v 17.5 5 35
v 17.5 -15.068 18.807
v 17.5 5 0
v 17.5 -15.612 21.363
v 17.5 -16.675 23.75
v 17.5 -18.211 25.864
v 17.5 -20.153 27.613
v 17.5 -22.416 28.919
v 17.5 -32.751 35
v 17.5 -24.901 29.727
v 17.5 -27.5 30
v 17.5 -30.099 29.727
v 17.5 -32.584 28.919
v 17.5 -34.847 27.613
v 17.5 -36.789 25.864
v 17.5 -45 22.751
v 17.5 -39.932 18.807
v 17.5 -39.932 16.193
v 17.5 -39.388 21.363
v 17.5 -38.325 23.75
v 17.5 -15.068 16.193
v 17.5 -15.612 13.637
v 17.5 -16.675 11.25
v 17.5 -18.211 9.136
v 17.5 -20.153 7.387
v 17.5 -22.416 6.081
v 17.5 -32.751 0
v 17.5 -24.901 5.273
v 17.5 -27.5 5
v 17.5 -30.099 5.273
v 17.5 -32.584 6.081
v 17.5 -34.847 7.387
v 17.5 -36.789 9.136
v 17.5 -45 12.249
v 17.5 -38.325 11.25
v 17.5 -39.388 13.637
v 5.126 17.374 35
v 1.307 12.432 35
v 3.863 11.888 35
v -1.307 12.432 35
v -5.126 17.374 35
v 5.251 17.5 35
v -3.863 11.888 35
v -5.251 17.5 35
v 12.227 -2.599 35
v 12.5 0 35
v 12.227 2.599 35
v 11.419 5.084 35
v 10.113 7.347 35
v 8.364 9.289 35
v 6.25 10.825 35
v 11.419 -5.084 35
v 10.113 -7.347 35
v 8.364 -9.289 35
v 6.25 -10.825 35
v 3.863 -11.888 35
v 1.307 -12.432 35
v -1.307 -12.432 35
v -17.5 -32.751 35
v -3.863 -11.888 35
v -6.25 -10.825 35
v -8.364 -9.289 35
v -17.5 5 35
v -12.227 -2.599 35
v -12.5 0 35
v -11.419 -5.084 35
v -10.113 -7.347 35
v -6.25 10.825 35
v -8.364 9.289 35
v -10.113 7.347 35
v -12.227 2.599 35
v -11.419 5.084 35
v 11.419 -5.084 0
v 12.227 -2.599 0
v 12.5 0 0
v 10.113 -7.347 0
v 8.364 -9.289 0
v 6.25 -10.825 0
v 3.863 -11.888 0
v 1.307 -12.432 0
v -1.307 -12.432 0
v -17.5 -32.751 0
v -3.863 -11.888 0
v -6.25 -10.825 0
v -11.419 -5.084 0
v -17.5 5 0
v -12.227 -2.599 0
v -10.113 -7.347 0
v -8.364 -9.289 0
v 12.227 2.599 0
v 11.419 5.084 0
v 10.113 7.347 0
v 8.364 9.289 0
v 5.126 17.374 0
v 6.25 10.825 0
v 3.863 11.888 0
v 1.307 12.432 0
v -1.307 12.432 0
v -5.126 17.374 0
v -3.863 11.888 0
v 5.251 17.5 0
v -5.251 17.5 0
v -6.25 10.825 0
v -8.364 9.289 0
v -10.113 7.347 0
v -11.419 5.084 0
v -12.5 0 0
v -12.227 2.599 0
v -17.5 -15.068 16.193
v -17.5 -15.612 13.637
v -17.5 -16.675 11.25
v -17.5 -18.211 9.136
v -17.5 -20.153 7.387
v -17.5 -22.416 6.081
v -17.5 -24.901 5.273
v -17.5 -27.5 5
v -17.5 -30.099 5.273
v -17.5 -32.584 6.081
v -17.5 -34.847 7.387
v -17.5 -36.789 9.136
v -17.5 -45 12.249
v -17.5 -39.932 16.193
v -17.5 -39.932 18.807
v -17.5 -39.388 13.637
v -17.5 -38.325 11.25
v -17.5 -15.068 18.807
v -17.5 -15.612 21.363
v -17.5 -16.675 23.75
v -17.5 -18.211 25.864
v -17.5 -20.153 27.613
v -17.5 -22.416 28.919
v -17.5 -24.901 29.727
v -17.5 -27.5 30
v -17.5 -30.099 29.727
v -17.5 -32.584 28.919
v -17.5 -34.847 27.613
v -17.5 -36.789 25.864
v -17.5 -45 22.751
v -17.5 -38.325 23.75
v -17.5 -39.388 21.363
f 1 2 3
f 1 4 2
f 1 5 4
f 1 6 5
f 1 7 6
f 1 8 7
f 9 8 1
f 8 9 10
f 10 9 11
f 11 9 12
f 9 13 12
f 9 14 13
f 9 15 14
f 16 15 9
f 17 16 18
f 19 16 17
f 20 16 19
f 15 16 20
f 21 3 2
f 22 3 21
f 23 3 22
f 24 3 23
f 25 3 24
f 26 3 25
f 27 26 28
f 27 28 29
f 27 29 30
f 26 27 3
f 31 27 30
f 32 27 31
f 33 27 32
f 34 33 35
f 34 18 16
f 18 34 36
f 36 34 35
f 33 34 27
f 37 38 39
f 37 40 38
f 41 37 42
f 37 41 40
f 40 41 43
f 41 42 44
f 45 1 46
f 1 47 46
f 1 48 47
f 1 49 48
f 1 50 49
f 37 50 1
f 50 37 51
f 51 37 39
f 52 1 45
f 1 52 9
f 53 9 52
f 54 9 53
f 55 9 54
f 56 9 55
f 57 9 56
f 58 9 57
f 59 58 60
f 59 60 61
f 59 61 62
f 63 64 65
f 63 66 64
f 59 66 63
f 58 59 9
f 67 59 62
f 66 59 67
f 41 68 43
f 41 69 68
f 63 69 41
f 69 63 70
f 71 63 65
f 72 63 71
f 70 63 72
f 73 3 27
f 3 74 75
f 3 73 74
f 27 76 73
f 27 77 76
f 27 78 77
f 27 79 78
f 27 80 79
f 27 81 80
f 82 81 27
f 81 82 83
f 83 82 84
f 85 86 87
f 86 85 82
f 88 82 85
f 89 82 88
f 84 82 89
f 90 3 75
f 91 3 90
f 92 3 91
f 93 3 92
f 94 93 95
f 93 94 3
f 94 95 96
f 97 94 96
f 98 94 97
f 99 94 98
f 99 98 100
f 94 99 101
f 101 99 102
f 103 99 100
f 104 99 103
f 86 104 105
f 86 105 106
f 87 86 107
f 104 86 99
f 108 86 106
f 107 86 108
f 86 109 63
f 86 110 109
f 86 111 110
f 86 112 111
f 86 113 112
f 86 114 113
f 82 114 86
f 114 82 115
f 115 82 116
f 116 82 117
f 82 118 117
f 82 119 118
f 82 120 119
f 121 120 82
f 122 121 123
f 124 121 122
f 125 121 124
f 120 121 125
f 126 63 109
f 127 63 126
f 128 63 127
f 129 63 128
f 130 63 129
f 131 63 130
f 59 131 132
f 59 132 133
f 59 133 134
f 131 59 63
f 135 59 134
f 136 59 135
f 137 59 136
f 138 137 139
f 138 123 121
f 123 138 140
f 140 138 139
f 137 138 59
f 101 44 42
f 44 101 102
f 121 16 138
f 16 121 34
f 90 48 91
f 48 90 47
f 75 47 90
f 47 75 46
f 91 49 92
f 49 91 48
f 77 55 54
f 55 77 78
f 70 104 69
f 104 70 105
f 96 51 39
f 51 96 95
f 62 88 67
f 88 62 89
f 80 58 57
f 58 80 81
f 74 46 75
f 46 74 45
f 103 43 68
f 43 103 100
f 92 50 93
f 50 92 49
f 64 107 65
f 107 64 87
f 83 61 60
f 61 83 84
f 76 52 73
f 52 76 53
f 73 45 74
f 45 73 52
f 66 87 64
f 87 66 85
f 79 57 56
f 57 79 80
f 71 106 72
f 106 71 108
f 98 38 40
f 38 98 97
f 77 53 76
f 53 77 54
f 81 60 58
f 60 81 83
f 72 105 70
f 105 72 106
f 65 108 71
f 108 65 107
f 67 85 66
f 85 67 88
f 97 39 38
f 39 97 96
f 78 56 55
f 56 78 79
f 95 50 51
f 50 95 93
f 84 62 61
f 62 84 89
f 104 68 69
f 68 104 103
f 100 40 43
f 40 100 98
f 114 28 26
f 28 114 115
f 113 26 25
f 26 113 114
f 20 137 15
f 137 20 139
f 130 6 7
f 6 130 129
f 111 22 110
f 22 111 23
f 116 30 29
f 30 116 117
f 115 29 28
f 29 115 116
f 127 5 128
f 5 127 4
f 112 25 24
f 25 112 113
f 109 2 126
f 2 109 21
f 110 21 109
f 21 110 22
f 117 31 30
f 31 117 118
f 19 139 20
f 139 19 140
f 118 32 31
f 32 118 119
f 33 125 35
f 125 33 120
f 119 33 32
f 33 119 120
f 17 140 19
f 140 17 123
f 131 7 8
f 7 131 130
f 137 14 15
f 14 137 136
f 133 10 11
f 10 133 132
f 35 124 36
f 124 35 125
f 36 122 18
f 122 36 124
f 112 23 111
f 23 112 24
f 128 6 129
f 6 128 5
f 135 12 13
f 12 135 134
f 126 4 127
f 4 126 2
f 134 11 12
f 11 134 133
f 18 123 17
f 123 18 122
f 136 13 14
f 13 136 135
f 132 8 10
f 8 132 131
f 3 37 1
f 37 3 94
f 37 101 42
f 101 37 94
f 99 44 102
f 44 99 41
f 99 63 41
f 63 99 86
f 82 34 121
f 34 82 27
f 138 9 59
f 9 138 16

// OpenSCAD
diameter=25;		
wall_thickness=diameter/5;
thickness_between_tubes=diameter/10;			
width=diameter+2*wall_thickness;
depth=diameter*2+2*wall_thickness+thickness_between_tubes;
height=width;
radius=diameter/2;

difference(){

translate([-(width/2),-(depth-radius-wall_thickness),0])
cube([width,depth,height]);

    cylinder(h=height,r1=radius,r2=radius);

    translate([-(radius+wall_thickness),-(diameter+thickness_between_tubes),radius+wall_thickness])
    rotate([0,90,0])
    cylinder(h=height,r1=radius,r2=radius);
    
    translate([width/2,wall_thickness,0])
    rotate([0,0,45])
    cube([width/2,radius+wall_thickness,height]);
    
    translate([-(width/2),wall_thickness,0])
    rotate([0,0,45])
    cube([width/2,radius+wall_thickness,height]); 
    
    translate([-(width/2),-(depth-wall_thickness),0])
    rotate([-45,0,0])
    cube([width,radius+wall_thickness,height/2]);
   
    translate([-(width/2),-(depth-wall_thickness),height])
    rotate([-45,0,0])
    cube([width,radius+wall_thickness,height/2]); 

    }
